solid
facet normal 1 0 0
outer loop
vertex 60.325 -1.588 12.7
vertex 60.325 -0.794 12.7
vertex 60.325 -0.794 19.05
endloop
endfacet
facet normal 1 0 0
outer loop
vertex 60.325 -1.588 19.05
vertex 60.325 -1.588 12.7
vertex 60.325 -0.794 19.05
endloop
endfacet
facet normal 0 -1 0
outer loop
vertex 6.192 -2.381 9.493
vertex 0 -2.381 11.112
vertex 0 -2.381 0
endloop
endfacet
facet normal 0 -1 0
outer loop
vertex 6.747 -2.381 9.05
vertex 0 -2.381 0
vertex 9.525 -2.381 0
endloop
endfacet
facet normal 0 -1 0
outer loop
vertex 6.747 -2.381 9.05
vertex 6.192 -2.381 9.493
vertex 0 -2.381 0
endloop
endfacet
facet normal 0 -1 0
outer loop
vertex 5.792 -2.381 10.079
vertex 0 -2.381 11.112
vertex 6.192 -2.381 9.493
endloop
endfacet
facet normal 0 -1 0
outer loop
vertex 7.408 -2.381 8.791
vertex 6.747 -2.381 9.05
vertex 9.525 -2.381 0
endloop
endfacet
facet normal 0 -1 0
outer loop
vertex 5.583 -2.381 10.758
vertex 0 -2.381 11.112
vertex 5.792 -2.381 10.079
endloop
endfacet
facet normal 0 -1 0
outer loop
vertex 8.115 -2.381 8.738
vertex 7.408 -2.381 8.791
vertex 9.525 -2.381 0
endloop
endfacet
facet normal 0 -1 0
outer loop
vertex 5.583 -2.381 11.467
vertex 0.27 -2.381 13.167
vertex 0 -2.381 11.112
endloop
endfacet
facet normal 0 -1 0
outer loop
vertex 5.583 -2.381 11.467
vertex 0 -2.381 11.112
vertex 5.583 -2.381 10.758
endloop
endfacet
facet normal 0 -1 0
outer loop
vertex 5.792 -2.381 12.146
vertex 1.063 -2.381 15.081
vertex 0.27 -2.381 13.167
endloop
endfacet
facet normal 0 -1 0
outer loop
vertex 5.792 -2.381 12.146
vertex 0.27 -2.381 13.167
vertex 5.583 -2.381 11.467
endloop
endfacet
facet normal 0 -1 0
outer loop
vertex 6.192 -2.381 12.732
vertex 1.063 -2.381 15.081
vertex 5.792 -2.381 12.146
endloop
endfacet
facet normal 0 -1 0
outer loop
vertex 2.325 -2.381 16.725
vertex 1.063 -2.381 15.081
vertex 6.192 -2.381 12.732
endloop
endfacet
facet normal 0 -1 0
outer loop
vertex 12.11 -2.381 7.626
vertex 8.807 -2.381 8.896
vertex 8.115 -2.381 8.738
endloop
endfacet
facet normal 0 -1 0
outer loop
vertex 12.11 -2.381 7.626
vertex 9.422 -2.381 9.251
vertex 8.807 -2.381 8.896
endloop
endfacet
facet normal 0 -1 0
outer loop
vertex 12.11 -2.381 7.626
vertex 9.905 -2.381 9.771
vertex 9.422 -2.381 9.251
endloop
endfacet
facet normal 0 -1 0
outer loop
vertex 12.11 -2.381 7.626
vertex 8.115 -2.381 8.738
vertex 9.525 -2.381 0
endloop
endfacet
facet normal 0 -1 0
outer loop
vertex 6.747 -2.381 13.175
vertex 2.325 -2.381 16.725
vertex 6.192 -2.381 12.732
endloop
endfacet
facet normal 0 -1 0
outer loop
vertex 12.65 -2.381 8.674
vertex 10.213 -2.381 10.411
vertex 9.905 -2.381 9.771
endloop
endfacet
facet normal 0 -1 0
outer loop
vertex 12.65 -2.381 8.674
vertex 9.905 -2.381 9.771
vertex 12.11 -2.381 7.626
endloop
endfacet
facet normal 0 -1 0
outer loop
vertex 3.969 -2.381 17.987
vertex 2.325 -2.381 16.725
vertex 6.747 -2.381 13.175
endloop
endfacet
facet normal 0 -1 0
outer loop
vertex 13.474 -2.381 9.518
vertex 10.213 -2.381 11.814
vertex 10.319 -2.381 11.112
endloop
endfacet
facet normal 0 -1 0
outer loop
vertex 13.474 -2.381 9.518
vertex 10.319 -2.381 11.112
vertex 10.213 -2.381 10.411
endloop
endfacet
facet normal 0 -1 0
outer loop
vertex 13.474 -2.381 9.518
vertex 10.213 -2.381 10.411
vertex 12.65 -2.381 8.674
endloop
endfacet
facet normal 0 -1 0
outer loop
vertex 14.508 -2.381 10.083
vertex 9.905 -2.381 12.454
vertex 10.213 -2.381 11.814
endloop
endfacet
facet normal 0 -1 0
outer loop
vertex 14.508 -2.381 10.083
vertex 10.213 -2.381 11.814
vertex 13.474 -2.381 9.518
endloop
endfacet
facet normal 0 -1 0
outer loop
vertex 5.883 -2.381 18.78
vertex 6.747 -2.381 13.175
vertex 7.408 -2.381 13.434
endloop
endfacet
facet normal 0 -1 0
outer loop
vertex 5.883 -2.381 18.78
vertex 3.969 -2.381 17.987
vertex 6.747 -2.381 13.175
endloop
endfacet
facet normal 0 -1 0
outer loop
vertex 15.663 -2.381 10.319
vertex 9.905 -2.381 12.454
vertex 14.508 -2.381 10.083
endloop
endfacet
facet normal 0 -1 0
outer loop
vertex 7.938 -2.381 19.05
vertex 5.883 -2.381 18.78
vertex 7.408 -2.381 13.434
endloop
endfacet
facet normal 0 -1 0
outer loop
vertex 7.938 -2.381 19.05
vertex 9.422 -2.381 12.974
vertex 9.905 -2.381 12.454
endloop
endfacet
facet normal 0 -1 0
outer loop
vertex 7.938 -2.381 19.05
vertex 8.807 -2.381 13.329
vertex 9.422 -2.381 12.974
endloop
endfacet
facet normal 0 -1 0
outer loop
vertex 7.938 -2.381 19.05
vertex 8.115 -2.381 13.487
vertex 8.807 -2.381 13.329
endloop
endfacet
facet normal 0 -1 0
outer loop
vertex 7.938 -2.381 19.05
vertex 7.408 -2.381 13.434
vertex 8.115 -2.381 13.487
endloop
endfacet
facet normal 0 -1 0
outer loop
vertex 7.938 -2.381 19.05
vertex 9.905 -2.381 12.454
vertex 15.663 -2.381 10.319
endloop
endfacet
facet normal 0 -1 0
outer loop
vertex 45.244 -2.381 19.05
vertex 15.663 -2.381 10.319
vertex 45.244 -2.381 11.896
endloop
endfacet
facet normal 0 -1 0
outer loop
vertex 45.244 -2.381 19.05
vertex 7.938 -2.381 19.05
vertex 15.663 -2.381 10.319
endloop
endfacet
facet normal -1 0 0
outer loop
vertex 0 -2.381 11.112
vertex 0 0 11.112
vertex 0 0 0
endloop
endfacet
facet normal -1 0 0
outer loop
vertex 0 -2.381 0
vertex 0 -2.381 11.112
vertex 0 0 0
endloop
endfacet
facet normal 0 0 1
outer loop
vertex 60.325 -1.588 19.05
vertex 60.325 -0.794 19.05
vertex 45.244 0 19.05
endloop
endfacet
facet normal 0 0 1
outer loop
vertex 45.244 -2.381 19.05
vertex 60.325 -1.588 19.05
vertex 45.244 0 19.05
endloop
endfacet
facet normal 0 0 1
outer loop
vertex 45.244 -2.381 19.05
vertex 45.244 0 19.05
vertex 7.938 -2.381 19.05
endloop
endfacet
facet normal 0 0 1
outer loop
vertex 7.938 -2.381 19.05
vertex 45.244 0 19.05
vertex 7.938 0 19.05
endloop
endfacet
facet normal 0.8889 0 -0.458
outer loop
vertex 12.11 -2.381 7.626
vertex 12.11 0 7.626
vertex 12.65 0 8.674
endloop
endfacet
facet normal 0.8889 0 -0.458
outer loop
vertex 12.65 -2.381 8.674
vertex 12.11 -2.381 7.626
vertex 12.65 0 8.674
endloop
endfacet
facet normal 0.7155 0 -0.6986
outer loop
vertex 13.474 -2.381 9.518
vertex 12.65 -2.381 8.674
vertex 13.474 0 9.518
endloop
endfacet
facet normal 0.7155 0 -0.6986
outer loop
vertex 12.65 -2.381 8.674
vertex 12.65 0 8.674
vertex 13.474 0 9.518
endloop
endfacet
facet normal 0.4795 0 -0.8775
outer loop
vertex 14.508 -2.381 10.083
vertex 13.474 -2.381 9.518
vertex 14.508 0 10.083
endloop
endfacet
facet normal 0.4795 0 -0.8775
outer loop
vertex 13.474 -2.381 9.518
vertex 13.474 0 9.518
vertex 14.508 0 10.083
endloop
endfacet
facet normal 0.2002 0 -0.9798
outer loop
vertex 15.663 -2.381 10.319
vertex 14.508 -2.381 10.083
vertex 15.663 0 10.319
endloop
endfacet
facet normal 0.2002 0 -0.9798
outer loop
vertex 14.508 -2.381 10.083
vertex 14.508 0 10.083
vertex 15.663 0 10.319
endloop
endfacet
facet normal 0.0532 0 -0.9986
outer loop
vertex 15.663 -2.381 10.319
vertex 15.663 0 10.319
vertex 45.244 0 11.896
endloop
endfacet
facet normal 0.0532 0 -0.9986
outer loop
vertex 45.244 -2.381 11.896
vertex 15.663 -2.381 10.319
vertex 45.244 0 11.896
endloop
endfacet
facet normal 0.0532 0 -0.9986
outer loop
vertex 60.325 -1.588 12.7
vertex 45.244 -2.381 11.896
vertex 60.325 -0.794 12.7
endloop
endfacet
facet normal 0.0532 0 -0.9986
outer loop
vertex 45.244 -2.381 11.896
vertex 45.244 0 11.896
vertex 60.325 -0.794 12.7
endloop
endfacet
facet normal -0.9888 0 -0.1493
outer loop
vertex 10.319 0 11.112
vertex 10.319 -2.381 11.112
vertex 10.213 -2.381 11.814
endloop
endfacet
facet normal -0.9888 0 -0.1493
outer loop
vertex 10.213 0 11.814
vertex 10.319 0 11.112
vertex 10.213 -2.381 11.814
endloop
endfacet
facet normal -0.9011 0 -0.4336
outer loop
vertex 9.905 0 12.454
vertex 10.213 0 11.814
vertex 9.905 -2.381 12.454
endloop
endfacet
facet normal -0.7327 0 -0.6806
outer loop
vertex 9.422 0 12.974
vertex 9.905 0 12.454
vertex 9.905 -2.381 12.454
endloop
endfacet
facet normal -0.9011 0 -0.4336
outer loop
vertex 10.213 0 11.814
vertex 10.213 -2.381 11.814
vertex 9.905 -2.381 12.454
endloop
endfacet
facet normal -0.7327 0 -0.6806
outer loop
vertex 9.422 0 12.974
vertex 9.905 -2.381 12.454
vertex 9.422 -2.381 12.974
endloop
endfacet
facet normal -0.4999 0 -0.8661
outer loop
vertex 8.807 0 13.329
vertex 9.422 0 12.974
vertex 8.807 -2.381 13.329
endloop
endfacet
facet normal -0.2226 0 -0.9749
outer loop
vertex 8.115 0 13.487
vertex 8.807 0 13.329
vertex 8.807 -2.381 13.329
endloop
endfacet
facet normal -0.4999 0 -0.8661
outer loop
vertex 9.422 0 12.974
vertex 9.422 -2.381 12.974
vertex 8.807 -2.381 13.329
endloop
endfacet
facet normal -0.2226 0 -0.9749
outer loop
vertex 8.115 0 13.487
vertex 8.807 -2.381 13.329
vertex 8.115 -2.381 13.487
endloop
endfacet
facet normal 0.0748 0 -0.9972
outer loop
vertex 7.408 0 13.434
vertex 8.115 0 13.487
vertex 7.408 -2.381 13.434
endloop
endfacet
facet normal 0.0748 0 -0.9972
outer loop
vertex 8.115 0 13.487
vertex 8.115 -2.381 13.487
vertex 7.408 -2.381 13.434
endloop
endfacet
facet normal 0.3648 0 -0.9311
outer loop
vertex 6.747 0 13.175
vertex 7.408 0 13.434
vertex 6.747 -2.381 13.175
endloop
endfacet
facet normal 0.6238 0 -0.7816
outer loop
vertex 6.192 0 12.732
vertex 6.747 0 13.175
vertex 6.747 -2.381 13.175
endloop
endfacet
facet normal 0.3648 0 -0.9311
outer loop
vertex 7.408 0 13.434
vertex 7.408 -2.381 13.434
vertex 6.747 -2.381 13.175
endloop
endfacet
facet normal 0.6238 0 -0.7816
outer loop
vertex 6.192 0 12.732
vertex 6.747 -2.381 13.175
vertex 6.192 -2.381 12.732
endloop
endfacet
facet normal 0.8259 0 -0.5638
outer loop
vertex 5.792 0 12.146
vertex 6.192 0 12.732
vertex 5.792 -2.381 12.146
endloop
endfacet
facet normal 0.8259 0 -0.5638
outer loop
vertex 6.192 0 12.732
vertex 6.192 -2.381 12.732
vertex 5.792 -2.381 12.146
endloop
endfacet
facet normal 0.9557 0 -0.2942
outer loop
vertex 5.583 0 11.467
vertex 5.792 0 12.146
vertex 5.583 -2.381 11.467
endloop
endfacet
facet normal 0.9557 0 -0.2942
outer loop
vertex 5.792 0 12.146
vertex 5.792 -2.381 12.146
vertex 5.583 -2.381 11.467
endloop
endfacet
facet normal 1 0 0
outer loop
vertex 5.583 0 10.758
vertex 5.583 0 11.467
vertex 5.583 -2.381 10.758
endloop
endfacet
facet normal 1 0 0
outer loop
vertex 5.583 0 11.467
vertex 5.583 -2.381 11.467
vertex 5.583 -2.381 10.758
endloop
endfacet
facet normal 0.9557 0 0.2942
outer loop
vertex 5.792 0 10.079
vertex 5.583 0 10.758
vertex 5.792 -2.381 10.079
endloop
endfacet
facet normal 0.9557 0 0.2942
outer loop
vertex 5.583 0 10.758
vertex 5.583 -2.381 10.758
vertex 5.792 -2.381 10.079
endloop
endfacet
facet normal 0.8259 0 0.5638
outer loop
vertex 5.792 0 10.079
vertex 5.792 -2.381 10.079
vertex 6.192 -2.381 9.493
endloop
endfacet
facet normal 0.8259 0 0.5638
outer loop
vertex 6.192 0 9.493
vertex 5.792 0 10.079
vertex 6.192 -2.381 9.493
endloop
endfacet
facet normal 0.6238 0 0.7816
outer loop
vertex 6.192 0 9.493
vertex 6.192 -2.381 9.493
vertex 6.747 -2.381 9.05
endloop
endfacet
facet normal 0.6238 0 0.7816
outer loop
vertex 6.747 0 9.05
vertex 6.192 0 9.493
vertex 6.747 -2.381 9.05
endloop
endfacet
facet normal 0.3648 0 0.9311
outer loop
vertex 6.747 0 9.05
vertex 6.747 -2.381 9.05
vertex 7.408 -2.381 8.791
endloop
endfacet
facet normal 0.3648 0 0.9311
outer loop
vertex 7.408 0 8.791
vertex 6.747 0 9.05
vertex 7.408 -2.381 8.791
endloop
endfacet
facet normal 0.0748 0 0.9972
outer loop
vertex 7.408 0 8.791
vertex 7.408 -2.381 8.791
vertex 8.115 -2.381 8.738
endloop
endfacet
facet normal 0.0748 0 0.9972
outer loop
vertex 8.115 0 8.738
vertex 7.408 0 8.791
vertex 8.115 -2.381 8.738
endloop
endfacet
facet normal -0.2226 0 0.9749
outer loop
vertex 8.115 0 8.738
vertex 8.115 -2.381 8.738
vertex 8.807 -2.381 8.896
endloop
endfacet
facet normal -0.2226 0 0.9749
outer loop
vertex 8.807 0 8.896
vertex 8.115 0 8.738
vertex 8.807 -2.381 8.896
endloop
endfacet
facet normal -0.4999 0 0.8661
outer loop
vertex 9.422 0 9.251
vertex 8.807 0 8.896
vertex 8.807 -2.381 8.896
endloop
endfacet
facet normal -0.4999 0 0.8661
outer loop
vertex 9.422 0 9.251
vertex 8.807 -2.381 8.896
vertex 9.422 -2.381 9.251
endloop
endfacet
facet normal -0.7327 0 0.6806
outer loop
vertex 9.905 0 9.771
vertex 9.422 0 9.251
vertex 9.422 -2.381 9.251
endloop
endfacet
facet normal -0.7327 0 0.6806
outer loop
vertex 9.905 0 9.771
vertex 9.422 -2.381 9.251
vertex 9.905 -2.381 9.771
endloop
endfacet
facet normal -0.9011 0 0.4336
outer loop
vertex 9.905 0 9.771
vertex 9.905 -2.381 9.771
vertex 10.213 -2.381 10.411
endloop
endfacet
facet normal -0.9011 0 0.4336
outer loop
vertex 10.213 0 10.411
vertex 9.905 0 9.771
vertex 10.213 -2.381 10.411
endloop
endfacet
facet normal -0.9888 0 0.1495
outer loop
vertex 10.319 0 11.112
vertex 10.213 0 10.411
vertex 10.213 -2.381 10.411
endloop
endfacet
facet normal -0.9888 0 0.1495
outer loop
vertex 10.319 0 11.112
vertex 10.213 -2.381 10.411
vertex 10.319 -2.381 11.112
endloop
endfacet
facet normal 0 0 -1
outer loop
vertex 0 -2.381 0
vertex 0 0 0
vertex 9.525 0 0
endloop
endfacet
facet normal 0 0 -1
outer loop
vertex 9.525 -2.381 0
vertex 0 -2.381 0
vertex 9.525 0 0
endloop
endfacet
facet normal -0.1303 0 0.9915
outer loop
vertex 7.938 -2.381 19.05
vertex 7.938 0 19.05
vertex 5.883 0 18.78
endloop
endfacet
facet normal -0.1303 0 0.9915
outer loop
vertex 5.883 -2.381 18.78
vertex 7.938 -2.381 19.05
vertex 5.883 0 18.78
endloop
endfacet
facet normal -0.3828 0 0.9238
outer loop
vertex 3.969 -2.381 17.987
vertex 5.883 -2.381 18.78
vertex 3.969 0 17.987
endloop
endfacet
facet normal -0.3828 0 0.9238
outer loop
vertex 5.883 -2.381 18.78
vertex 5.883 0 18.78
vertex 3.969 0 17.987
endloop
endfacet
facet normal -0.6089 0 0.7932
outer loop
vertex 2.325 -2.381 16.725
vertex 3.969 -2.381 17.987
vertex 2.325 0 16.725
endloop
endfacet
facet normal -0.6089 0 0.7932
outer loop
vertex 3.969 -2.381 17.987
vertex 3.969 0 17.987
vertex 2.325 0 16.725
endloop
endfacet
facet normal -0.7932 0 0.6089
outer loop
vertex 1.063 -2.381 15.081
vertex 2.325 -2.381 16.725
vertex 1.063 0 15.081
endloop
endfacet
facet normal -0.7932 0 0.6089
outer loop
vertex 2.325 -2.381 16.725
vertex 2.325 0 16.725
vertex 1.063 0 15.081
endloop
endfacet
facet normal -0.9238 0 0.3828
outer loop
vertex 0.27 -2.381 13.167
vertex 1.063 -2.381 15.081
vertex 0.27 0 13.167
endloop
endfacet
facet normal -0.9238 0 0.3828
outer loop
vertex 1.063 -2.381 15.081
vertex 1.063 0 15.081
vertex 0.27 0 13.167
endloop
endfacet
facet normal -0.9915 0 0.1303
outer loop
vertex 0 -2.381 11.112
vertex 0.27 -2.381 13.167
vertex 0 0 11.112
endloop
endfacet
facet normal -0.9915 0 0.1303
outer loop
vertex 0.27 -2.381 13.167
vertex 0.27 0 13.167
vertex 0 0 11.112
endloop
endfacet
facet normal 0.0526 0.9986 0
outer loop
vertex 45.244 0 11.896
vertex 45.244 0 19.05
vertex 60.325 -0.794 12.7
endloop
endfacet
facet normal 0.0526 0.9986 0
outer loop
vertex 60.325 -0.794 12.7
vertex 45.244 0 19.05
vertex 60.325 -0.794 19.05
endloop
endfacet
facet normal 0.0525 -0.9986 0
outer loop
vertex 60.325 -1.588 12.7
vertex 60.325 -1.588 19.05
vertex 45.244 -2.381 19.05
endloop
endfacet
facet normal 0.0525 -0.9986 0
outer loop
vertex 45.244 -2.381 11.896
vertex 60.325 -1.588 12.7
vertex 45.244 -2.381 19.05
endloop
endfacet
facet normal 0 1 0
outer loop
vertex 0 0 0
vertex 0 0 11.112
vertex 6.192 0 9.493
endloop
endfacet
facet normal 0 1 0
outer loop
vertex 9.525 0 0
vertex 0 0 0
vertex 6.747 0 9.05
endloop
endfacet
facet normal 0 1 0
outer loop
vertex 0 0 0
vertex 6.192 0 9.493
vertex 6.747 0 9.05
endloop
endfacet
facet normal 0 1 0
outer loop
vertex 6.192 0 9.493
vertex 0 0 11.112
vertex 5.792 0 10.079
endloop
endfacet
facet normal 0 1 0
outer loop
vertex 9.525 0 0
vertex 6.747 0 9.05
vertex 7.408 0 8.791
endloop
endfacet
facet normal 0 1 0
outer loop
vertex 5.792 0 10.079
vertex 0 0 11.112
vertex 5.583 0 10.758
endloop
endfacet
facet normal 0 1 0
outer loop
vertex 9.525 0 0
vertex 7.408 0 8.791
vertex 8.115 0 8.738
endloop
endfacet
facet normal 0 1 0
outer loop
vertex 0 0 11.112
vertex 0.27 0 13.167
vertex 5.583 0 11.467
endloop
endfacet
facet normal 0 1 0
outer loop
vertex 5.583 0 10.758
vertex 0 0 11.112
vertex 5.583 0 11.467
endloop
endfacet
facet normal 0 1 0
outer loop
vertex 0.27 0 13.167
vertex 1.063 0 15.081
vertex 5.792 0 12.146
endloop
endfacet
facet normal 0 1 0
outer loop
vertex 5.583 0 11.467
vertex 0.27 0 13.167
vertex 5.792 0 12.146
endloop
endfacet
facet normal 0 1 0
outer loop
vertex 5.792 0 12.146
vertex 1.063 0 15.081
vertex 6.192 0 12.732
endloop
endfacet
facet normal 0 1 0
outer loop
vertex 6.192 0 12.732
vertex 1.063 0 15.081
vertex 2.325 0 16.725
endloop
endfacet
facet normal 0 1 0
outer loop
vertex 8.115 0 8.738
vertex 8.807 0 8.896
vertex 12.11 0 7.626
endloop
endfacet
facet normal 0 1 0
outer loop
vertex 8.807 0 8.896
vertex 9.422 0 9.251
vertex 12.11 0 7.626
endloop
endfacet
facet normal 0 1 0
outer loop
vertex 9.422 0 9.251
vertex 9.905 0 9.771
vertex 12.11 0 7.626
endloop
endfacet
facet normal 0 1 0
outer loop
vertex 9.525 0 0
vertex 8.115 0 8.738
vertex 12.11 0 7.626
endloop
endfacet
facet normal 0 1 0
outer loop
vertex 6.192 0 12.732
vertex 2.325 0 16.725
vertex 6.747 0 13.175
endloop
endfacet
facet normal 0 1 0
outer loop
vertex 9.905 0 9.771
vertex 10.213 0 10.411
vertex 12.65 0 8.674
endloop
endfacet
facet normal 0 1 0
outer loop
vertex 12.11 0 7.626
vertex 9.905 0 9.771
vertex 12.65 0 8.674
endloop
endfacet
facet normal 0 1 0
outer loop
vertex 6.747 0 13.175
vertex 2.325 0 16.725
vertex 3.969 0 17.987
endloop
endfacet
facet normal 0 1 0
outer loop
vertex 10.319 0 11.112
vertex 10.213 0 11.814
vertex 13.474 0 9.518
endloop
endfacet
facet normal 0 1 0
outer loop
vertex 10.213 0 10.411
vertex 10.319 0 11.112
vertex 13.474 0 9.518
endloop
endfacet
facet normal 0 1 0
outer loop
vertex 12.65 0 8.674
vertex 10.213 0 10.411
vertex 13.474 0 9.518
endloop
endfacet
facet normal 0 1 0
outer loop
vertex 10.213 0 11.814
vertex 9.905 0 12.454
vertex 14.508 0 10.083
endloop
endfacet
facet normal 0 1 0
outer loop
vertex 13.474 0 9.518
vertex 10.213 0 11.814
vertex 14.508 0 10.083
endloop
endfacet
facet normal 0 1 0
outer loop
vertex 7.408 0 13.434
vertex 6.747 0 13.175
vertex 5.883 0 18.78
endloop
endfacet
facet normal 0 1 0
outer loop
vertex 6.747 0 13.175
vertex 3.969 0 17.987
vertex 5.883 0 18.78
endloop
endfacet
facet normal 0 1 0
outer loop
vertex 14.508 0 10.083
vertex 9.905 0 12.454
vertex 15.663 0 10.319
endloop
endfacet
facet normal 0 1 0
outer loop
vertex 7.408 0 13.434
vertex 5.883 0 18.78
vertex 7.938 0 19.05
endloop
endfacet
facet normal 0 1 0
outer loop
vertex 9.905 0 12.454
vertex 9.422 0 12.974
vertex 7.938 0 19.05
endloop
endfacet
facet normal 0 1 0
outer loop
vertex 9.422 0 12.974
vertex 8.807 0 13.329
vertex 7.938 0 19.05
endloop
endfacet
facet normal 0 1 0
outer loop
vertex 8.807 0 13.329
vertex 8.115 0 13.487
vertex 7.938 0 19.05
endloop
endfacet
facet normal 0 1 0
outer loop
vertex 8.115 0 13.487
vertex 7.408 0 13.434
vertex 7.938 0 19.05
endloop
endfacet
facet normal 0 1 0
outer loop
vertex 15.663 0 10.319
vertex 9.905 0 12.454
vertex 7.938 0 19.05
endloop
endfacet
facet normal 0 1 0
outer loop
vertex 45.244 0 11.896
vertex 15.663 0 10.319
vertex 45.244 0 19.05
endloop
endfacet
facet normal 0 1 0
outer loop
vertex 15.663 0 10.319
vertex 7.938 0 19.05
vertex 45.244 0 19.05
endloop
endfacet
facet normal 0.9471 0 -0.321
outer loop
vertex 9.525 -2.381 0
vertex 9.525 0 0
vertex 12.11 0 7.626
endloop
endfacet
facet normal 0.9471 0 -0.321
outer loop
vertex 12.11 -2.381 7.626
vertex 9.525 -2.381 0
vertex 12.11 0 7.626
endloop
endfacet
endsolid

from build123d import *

# Parameters (mm, degrees)
F1_DEPTH = 2.38125
F2_R     = 2.38125
F3_DEPTH = 25.4
F5_DEPTH = 25.4


with BuildPart() as f1:
    # F0 (on Front) → F1 (new body)
    with BuildSketch(Plane.XZ):
        with BuildLine():
            Line((60.325, 19.05), (7.9375, 19.05))
            ThreePointArc((7.9375, 19.05), (2.32484, 16.72516), (0, 11.1125))
            Line((0, 11.1125), (0, 0))
            Line((0, 0), (9.525, 0))
            Line((9.525, 0), (12.110345, 7.626242))
            ThreePointArc((12.110345, 7.626242), (13.473756, 9.517878), (15.663421, 10.319465))
            Line((15.663421, 10.319465), (60.325, 12.7))
            Line((60.325, 12.7), (60.325, 19.05))
        make_face()
    extrude(amount=F1_DEPTH)

    # F2 (on face) → F3 (cut)
    with BuildSketch(Plane.XZ.offset(2.38125)):
        with Locations((7.9375, 11.1125)):
            Circle(F2_R)
    extrude(amount=-F3_DEPTH, mode=Mode.SUBTRACT)

    # F4 (on face) → F5 (cut)
    with BuildSketch(Plane.XY.offset(19.05)):
        Polygon((60.325, 0), (45.24375, 0), (60.325, -0.79375), align=None)
        Polygon((60.325, -2.38125), (60.325, -1.5875), (45.24375, -2.38125), align=None)
    extrude(amount=-F5_DEPTH, mode=Mode.SUBTRACT)


solid = f1.part
